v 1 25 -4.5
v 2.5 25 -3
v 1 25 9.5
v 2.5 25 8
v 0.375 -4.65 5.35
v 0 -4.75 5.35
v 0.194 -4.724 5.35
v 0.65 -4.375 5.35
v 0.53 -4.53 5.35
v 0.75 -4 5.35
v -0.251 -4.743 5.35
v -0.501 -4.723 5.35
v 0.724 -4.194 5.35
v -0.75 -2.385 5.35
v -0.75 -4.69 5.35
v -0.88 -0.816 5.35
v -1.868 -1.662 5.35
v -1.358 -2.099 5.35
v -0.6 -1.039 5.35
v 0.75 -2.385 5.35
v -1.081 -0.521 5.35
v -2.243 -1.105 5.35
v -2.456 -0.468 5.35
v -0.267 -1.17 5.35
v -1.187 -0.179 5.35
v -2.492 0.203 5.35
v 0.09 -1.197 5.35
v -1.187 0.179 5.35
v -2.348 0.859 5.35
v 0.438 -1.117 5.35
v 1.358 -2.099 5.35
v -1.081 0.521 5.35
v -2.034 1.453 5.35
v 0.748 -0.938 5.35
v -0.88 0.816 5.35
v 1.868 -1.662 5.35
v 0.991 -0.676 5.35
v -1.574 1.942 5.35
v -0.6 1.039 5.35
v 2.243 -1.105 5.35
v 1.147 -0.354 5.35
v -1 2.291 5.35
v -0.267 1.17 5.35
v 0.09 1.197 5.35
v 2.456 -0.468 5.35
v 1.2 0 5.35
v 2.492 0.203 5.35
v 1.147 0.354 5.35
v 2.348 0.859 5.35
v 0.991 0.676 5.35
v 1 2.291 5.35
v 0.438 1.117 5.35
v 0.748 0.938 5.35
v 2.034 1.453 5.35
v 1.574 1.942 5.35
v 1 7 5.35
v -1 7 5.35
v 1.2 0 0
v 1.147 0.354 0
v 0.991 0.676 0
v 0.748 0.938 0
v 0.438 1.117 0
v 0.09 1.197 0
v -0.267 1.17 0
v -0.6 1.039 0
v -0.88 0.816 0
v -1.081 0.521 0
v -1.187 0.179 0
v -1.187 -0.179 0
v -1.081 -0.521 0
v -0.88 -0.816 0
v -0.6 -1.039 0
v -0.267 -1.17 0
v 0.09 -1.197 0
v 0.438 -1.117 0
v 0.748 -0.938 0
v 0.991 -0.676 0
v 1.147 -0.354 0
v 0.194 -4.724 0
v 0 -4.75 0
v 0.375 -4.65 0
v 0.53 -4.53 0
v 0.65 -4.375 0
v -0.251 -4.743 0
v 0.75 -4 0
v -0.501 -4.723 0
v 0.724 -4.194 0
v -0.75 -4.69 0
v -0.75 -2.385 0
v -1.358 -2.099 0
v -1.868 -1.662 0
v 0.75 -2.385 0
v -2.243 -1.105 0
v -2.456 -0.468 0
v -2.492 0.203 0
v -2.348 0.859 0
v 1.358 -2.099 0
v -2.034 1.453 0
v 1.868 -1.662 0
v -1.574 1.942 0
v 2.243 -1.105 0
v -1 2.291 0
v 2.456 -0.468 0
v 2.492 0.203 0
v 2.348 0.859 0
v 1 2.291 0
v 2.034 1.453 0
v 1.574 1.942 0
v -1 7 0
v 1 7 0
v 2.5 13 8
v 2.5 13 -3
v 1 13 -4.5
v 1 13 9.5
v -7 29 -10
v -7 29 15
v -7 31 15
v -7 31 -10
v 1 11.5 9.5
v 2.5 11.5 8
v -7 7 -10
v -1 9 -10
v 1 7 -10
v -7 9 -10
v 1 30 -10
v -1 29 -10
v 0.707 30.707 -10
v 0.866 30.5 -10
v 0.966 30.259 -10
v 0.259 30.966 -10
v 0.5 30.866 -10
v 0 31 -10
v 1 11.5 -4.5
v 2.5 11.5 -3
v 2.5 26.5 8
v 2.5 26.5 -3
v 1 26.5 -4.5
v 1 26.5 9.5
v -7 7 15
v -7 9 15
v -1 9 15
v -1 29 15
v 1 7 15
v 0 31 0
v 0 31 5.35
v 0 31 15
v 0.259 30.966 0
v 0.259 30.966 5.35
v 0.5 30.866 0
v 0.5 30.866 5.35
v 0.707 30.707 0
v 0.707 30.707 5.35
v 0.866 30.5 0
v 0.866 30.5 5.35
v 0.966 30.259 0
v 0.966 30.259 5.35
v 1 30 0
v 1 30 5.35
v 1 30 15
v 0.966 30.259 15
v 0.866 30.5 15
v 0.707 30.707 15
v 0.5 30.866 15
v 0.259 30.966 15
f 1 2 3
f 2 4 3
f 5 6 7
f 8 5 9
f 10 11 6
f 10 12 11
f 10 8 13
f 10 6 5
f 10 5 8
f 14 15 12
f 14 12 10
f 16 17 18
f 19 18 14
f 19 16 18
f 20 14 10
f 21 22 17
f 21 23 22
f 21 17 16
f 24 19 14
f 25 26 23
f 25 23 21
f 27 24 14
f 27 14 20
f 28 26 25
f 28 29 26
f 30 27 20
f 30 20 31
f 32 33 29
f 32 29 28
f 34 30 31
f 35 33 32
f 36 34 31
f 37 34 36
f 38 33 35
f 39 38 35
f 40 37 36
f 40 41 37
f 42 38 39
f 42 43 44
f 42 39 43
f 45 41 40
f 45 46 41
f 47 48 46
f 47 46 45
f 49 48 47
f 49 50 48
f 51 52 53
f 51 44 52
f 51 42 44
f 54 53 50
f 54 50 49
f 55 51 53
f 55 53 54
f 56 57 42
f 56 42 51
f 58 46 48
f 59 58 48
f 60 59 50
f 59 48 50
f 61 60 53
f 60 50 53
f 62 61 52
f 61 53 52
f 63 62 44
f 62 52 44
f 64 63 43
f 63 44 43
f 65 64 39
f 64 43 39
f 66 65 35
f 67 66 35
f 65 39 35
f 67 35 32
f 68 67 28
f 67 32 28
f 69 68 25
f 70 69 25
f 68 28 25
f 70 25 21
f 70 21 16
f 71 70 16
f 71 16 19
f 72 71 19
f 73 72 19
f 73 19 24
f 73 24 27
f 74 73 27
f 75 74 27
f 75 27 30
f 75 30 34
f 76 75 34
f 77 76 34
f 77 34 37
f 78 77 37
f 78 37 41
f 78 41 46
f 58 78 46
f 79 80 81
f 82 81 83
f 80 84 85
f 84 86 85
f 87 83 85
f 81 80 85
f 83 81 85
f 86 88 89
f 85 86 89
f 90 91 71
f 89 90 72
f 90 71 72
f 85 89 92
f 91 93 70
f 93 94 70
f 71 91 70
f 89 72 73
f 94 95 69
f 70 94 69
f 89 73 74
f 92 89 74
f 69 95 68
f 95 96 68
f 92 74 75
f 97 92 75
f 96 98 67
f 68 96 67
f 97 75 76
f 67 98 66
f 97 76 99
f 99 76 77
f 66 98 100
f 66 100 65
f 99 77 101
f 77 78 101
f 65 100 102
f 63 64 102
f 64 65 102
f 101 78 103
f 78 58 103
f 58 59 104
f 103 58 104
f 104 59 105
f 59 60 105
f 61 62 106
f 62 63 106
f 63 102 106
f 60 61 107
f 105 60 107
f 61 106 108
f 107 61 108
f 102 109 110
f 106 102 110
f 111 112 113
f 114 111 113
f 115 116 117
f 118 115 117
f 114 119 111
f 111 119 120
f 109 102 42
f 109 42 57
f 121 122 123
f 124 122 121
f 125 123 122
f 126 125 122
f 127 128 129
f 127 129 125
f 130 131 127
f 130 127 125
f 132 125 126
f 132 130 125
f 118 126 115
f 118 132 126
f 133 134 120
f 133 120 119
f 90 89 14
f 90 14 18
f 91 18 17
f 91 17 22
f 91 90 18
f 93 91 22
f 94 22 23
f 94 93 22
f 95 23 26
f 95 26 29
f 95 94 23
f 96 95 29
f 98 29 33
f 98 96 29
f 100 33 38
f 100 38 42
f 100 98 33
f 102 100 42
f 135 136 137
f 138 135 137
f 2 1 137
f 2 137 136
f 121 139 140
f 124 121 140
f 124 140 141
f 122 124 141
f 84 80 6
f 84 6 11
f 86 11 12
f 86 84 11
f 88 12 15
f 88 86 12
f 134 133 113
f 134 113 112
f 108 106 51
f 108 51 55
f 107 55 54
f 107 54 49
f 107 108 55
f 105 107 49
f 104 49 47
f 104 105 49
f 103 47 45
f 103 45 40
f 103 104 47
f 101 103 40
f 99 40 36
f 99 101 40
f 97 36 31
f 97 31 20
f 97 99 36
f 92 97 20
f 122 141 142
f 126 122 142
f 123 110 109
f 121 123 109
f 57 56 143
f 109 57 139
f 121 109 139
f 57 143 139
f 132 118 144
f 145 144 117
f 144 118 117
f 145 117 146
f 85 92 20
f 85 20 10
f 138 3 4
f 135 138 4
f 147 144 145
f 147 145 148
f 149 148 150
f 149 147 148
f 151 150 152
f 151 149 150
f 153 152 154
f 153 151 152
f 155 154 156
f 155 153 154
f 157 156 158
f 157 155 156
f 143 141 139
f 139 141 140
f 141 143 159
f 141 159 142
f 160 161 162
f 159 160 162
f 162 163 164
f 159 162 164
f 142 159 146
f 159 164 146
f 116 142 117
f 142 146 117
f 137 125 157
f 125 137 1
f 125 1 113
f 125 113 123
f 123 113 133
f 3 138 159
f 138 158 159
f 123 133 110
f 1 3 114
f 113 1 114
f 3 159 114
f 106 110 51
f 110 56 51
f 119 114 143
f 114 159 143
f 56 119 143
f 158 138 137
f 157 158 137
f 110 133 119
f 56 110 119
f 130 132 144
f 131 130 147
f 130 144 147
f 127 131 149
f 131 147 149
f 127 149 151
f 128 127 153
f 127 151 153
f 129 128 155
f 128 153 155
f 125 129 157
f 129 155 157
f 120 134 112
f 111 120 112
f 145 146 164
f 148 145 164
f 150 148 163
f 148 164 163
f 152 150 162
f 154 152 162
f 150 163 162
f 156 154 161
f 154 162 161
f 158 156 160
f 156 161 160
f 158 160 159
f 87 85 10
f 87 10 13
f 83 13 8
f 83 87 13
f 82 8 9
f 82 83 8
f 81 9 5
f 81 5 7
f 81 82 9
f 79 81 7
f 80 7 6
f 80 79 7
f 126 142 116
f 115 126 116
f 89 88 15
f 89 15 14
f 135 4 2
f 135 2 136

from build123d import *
from build123d.topology import SkipClean

# Parameters (mm, degrees)
LEVER_R                       = 1
BOSS_EXTRUDE1_DEPTH           = 5.35
SKETCH1_R                     = 1.2
CUT_EXTRUDE1_DEPTH            = 32.557448
UPPERJAW_DEPTH                = 5.35
SKETCH5_W                     = 6
SKETCH5_H                     = 2
LOWERJAW_DEPTH                = 5.35
BANDCAPTURE_DEPTH             = 5
BANDCAPTURE_DEPTH_BACK        = 10
SKETCH6_W                     = 1.5
SKETCH6_H                     = 15
CUT_EXTRUDE3_DEPTH            = 34.316662
CUT_EXTRUDE3_DEPTH_BACK       = 34.316662
SKETCH7_W                     = 1.5
SKETCH7_H                     = 12
BATTERYCRADLEWIDTH_DEPTH      = 10
BATTERYCRADLEWIDTH_DEPTH_BACK = 15
CHAMFER1_SIZE                 = 2


with BuildPart() as part:
    # lever → Boss-Extrude1 (new body)
    with BuildSketch(Plane.XY):
        with BuildLine():
            Line((-0.75, -4.690416), (-0.75, -2.384848))
            ThreePointArc((-0.75, -2.384848), (-2.496435, -0.133467), (-1, 2.291288))
            Line((-1, 2.291288), (-1, 30))
            ThreePointArc((-1, 30), (0, 31), (1, 30))
            Line((1, 30), (1, 2.291288))
            ThreePointArc((1, 2.291288), (2.496435, -0.133467), (0.75, -2.384848))
            Line((0.75, -2.384848), (0.75, -4))
            ThreePointArc((0.75, -4), (0.53033, -4.53033), (0, -4.75))
            ThreePointArc((0, -4.75), (-0.376182, -4.735081), (-0.75, -4.690416))
        make_face()
        Circle(LEVER_R, mode=Mode.SUBTRACT)
    extrude(amount=BOSS_EXTRUDE1_DEPTH)

    # Sketch1 → Cut-Extrude1 (cut, through all)
    with BuildSketch(Plane.XY.offset(5.35)):
        Circle(SKETCH1_R)
    extrude(amount=-CUT_EXTRUDE1_DEPTH, mode=Mode.SUBTRACT)

    # Sketch4 → UpperJaw (add)
    with BuildSketch(Plane(origin=(0, 0, 0), x_dir=(-1, 0, 0), z_dir=(0, 0, -1))):
        with BuildLine():
            Line((0, 31), (7, 31))
            Line((7, 31), (7, 29))
            Line((7, 29), (1, 29))
            Line((1, 29), (1, 30))
            ThreePointArc((1, 30), (0.707107, 30.707107), (0, 31))
        make_face()
    extrude(amount=-UPPERJAW_DEPTH)

    # Sketch5 → LowerJaw (add, through all)
    with BuildSketch(Plane(origin=(0, 0, 0), x_dir=(-1, 0, 0), z_dir=(0, 0, -1))):
        with Locations((4, 8)):
            Rectangle(SKETCH5_W, SKETCH5_H)
    extrude(amount=-LOWERJAW_DEPTH)

    # Sketch6 → BandCapture (add, two sides: drawn at the far end of the back side and taken through both)
    with BuildSketch(Plane(origin=(0, 0, 0), x_dir=(-1, 0, 0), z_dir=(0, 0, -1)).offset(-BANDCAPTURE_DEPTH_BACK)):
        with Locations((-1.75, 19)):
            Rectangle(SKETCH6_W, SKETCH6_H)
    extrude(amount=BANDCAPTURE_DEPTH + BANDCAPTURE_DEPTH_BACK)

    # Sketch7 → Cut-Extrude3 (cut, two sides: drawn at the far end of the back side and taken through both)
    with BuildSketch(Plane(origin=(0, 0, 0), x_dir=(-1, 0, 0), z_dir=(0, 0, -1)).offset(-CUT_EXTRUDE3_DEPTH_BACK)):
        with Locations((-1.75, 19)):
            Rectangle(SKETCH7_W, SKETCH7_H)
    extrude(amount=CUT_EXTRUDE3_DEPTH + CUT_EXTRUDE3_DEPTH_BACK, mode=Mode.SUBTRACT)

    # Sketch8 → BatteryCradleWidth (add, two sides: drawn at the far end of the back side and taken through both)
    with SkipClean():  # the faces are left unmerged after this step: merging them gives an invalid solid
        with BuildSketch(Plane(origin=(0, 0, 0), x_dir=(-1, 0, 0), z_dir=(0, 0, -1)).offset(-BATTERYCRADLEWIDTH_DEPTH_BACK)):
            with BuildLine():
                Line((-1, 7), (7, 7))
                Line((7, 7), (7, 9))
                Line((7, 9), (1, 9))
                Line((1, 9), (1, 29))
                Line((1, 29), (7, 29))
                Line((7, 29), (7, 31))
                Line((7, 31), (0, 31))
                ThreePointArc((0, 31), (-0.707107, 30.707107), (-1, 30))
                Line((-1, 30), (-1, 7))
            make_face()
        extrude(amount=BATTERYCRADLEWIDTH_DEPTH + BATTERYCRADLEWIDTH_DEPTH_BACK)

    # Chamfer1
    # the kernel refuses this chamfer: 2 mm, written as the material it takes off along each edge
    with BuildSketch(Plane(origin=(2.5, 19.856634, 10), x_dir=(-0.9996219169112968, 0, 0.027495876610586487), z_dir=(0, 1, 0))) as chamfer1_piece_1_section:
        Polygon((CHAMFER1_SIZE * 0.999621916911, -CHAMFER1_SIZE * 0.0274958766106), (-CHAMFER1_SIZE * 0.0274958766106, -CHAMFER1_SIZE * 0.999621916911), (0, 0), align=None)
    chamfer1_piece_1 = extrude(amount=11.786732, mode=Mode.PRIVATE)
    chamfer1_piece_1 = split(chamfer1_piece_1, bisect_by=Plane(origin=(1, 25.75, 9.296082), z_dir=(1, 0, 0)), keep=Keep.TOP, mode=Mode.PRIVATE)
    add(chamfer1_piece_1, mode=Mode.SUBTRACT)
    with BuildSketch(Plane(origin=(2.5, 6.356634, 10), x_dir=(-0.9996219169112968, 0, 0.027495876610586487), z_dir=(0, 1, 0))) as chamfer1_piece_2_section:
        Polygon((CHAMFER1_SIZE * 0.999621916911, -CHAMFER1_SIZE * 0.0274958766106), (-CHAMFER1_SIZE * 0.0274958766106, -CHAMFER1_SIZE * 0.999621916911), (0, 0), align=None)
    chamfer1_piece_2 = extrude(amount=11.786732, mode=Mode.PRIVATE)
    chamfer1_piece_2 = split(chamfer1_piece_2, bisect_by=Plane(origin=(1, 12.25, 9.296082), z_dir=(1, 0, 0)), keep=Keep.TOP, mode=Mode.PRIVATE)
    add(chamfer1_piece_2, mode=Mode.SUBTRACT)
    with BuildSketch(Plane(origin=(2.5, 6.356634, -5), x_dir=(-0.9996219169112968, 0, -0.027495876610586487), z_dir=(0, 1, 0))) as chamfer1_piece_3_section:
        Polygon((CHAMFER1_SIZE * 0.999621916911, CHAMFER1_SIZE * 0.0274958766106), (-CHAMFER1_SIZE * 0.0274958766106, CHAMFER1_SIZE * 0.999621916911), (0, 0), align=None)
    chamfer1_piece_3 = extrude(amount=11.786732, mode=Mode.PRIVATE)
    chamfer1_piece_3 = split(chamfer1_piece_3, bisect_by=Plane(origin=(1, 12.25, -4.296082), z_dir=(1, 0, 0)), keep=Keep.TOP, mode=Mode.PRIVATE)
    add(chamfer1_piece_3, mode=Mode.SUBTRACT)
    with BuildSketch(Plane(origin=(2.5, 19.856634, -5), x_dir=(-0.9996219169112968, 0, -0.027495876610586487), z_dir=(0, 1, 0))) as chamfer1_piece_4_section:
        Polygon((CHAMFER1_SIZE * 0.999621916911, CHAMFER1_SIZE * 0.0274958766106), (-CHAMFER1_SIZE * 0.0274958766106, CHAMFER1_SIZE * 0.999621916911), (0, 0), align=None)
    chamfer1_piece_4 = extrude(amount=11.786732, mode=Mode.PRIVATE)
    chamfer1_piece_4 = split(chamfer1_piece_4, bisect_by=Plane(origin=(1, 25.75, -4.296082), z_dir=(1, 0, 0)), keep=Keep.TOP, mode=Mode.PRIVATE)
    add(chamfer1_piece_4, mode=Mode.SUBTRACT)


solid = part.part
